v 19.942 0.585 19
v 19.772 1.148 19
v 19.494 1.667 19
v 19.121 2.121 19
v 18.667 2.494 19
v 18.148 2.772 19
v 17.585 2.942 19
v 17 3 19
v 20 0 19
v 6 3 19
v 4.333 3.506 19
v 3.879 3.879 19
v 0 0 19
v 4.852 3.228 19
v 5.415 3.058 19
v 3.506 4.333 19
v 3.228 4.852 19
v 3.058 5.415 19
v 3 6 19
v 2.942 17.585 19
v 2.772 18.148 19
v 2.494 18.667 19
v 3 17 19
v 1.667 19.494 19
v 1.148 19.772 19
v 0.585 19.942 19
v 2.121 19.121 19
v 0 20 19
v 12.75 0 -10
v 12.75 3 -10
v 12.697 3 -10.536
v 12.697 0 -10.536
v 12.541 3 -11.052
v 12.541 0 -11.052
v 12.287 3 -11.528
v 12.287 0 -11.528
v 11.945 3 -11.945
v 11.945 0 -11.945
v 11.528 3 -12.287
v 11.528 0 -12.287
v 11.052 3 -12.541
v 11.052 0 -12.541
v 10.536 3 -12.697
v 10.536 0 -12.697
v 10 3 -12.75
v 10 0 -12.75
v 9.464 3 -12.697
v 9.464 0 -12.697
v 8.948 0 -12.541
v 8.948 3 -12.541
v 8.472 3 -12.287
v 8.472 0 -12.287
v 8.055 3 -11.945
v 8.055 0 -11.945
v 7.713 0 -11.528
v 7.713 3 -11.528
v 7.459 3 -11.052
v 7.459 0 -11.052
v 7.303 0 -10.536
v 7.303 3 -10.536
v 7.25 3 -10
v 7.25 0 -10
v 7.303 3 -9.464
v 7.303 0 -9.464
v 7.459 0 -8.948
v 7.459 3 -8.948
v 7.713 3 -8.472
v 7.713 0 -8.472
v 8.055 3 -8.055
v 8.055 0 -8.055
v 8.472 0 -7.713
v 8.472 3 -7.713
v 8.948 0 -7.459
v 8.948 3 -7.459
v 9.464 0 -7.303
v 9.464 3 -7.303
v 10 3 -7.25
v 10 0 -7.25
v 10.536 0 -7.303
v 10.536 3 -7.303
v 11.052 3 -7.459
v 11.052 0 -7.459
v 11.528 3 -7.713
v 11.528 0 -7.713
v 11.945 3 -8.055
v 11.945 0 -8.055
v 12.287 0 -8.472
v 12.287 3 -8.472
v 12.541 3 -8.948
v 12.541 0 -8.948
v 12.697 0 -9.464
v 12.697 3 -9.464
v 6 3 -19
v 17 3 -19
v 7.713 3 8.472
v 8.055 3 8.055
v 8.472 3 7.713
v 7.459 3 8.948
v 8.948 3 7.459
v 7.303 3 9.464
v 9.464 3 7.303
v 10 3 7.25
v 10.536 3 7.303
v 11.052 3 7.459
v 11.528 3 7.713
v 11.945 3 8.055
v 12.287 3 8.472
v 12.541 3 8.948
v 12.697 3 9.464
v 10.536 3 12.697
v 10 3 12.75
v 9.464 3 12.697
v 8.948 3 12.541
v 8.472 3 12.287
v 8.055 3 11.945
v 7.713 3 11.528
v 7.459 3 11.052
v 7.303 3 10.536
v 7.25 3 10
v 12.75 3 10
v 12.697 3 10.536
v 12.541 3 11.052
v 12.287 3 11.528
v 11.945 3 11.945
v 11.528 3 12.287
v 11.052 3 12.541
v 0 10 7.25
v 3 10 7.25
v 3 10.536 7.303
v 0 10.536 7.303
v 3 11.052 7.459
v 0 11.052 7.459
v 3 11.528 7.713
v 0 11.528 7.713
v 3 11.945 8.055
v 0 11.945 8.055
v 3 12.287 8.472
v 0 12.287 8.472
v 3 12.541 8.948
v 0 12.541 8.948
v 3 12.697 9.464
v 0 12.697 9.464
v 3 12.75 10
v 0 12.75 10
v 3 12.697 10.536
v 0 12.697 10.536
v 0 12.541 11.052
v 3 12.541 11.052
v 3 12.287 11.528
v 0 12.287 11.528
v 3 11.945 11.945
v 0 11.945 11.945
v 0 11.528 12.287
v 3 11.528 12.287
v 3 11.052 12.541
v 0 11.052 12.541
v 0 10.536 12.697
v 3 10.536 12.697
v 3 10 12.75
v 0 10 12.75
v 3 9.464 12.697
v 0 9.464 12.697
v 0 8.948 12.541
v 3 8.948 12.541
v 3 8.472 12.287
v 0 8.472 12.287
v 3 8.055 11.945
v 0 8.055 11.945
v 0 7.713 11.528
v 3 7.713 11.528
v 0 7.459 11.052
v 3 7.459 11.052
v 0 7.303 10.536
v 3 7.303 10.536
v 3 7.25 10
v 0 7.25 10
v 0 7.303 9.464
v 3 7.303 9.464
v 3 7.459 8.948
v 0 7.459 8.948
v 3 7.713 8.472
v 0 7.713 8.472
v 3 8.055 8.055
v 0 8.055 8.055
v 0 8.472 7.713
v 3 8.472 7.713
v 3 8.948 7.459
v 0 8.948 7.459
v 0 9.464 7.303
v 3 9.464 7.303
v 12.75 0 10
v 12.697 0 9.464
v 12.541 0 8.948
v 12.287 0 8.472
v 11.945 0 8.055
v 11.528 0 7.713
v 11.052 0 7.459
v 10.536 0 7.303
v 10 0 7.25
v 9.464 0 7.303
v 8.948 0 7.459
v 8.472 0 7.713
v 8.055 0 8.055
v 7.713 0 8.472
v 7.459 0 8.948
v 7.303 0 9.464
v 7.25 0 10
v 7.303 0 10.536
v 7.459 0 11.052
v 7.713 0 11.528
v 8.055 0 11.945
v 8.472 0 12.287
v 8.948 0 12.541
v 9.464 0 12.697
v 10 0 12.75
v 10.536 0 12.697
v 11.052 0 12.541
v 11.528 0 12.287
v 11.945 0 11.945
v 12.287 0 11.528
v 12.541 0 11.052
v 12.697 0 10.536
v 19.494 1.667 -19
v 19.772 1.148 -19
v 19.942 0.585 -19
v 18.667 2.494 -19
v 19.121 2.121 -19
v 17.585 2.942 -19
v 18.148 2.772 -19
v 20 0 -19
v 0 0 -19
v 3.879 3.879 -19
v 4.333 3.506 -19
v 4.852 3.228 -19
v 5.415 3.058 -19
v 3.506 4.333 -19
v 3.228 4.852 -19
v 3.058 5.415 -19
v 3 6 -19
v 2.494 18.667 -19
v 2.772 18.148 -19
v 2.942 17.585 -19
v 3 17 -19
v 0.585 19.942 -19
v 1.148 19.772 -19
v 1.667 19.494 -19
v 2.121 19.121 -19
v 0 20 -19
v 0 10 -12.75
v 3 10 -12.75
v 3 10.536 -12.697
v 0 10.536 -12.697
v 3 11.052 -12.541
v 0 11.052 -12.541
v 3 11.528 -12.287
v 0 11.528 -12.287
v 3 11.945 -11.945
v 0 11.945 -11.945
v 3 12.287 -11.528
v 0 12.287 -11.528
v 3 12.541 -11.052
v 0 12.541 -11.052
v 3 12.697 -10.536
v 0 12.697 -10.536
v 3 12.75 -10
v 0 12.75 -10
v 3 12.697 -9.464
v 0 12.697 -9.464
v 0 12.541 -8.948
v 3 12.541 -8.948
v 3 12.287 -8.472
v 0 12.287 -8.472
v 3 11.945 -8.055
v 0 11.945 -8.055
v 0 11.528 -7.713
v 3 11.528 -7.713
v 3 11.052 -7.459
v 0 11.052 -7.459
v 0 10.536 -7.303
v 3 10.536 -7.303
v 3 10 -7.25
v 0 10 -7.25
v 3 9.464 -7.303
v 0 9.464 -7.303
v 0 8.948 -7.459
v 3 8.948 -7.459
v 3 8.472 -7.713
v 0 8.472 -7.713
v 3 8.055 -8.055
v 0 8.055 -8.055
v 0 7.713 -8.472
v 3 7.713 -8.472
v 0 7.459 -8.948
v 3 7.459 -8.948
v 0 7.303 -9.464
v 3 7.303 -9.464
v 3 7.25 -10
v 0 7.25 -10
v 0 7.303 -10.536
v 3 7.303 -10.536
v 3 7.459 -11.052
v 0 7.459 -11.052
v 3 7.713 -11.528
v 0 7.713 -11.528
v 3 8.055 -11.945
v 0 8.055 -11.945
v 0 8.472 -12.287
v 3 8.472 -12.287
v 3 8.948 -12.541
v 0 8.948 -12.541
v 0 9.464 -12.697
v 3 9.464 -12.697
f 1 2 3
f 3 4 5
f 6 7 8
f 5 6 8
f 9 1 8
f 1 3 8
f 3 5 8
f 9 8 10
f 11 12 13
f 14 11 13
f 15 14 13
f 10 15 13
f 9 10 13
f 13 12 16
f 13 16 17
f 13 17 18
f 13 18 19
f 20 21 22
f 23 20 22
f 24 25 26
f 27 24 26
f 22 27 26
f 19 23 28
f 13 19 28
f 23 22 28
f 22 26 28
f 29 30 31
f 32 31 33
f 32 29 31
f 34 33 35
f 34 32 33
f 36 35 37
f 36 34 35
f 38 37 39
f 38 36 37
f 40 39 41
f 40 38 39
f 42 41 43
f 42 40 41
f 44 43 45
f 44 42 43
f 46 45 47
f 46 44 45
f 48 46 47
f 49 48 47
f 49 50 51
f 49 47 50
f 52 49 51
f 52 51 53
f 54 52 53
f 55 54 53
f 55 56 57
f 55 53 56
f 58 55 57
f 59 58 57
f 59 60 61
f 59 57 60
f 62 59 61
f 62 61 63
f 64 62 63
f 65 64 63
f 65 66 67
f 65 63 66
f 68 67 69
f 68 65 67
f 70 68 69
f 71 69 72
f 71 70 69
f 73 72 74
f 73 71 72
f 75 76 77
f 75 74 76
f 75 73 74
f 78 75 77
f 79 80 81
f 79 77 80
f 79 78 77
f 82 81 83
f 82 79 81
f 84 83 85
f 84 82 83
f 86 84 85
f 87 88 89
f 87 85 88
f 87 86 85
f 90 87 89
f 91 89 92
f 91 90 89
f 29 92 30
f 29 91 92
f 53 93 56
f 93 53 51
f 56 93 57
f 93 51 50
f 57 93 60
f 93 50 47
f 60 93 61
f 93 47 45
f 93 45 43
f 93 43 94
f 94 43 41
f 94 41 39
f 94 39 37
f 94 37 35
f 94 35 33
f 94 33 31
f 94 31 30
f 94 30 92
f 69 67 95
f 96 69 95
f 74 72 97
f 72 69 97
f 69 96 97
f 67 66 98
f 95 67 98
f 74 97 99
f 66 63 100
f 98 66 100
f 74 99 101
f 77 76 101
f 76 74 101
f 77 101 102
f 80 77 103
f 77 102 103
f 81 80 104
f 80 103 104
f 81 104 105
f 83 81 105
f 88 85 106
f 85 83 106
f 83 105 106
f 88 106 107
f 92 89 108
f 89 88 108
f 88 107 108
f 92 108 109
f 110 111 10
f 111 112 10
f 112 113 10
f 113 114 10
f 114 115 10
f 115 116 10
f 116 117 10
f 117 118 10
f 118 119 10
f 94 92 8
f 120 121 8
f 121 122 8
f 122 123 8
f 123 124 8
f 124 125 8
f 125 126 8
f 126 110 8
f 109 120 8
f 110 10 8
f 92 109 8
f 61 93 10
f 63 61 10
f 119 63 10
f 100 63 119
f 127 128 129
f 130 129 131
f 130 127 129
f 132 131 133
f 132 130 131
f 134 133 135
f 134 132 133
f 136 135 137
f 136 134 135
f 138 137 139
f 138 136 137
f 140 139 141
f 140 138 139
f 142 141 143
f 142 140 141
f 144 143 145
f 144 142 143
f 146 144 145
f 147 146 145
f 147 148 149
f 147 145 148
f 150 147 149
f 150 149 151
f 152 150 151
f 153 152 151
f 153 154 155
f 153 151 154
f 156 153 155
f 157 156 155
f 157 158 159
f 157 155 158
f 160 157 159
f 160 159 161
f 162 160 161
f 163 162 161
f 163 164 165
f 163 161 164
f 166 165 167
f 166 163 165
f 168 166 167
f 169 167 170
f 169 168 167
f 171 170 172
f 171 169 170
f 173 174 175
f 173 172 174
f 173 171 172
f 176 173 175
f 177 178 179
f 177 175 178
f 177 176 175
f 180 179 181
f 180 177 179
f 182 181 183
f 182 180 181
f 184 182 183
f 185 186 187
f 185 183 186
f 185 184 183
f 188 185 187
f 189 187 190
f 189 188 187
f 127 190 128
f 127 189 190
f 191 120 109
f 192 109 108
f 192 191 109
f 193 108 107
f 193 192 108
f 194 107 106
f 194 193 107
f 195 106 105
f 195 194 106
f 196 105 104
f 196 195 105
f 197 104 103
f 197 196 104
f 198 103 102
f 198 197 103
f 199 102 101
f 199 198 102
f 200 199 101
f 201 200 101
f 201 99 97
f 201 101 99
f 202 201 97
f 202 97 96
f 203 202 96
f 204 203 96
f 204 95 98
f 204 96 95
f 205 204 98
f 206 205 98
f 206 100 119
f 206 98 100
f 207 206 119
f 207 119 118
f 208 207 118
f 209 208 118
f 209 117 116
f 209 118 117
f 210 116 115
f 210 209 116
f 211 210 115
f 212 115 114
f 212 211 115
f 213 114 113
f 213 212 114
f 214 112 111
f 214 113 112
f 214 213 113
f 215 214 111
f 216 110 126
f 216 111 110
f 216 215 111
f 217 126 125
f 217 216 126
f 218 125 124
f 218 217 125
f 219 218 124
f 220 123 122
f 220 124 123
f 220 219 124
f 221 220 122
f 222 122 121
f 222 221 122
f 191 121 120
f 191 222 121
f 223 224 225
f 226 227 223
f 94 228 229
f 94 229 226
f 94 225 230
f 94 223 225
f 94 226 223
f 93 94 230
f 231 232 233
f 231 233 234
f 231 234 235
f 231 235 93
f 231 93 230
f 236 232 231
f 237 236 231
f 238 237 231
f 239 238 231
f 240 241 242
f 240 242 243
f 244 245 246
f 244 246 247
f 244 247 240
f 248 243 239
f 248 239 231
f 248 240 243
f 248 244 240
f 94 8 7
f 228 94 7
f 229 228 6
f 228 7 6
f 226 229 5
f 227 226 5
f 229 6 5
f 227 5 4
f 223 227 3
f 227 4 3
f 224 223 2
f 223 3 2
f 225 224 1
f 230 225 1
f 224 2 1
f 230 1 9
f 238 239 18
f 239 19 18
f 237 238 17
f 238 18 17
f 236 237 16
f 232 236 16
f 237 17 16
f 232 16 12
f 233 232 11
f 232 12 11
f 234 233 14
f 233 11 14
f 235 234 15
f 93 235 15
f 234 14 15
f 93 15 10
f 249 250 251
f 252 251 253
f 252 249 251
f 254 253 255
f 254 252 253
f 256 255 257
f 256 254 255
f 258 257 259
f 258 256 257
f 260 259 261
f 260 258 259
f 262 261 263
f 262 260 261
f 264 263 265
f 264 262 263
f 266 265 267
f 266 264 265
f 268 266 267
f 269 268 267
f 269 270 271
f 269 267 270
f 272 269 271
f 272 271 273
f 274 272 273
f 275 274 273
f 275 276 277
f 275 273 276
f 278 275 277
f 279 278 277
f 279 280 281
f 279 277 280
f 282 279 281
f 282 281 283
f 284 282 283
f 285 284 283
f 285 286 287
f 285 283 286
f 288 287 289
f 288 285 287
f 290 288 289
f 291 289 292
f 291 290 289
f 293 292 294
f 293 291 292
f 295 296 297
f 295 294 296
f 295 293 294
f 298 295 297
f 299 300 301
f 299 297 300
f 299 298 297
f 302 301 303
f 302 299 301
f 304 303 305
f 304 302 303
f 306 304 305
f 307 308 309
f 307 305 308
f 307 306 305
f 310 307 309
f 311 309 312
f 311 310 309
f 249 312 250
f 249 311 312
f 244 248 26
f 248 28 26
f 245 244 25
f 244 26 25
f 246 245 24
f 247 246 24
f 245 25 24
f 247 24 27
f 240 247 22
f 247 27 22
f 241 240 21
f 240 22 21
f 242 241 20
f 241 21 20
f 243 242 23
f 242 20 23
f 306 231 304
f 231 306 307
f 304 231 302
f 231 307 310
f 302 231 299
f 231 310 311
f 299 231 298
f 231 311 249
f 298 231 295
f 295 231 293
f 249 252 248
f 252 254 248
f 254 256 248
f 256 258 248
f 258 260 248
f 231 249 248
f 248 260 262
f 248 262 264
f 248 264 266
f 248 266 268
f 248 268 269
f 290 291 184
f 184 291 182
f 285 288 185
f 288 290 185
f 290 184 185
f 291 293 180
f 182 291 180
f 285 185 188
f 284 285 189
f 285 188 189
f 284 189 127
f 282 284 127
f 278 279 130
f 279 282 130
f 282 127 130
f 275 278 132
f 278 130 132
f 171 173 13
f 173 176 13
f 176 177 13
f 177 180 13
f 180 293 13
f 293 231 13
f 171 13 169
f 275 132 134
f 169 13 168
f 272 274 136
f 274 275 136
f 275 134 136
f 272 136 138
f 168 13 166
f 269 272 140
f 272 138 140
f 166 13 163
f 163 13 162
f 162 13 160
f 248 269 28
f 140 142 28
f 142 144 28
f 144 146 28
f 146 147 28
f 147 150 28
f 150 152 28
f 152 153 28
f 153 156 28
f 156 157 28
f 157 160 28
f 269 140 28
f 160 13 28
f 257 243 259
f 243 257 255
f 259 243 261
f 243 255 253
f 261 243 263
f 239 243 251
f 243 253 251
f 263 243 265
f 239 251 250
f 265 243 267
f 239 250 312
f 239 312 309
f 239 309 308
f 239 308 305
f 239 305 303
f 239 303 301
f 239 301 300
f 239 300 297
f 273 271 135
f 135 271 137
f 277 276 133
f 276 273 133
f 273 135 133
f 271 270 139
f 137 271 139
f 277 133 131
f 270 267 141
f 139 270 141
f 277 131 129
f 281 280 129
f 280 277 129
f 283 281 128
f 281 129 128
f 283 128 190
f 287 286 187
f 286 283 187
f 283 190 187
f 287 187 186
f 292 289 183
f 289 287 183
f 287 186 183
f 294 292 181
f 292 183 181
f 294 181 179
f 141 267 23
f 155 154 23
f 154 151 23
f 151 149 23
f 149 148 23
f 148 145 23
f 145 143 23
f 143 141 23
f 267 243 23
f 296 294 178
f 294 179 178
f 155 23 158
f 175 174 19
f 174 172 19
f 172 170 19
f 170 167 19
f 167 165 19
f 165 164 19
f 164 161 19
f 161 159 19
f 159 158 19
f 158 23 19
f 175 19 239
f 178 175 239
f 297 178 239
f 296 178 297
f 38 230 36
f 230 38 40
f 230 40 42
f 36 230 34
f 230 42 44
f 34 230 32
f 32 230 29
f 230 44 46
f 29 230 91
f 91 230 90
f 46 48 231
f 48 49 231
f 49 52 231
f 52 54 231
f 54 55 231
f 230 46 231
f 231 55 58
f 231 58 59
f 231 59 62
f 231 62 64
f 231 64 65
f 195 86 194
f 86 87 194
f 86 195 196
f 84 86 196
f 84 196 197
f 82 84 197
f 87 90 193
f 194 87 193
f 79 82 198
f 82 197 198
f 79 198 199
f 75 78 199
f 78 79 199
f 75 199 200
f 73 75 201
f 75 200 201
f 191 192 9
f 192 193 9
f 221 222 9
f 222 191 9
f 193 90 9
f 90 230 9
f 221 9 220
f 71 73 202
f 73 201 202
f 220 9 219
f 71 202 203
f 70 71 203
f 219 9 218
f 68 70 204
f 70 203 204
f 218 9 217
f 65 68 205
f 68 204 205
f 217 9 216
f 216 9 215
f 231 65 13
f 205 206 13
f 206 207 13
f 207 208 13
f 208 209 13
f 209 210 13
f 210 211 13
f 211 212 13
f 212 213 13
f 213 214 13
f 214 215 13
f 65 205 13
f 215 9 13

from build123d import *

# Parameters (mm, degrees)
BOSS_EXTRUDE1_DEPTH = 19
SKETCH2_R           = 2.75
CUT_EXTRUDE1_DEPTH  = 21
SKETCH3_R           = 2.75
CUT_EXTRUDE2_DEPTH  = 21


with BuildPart() as part:
    # Sketch1 → Boss-Extrude1 (new body, symmetric)
    with BuildSketch(Plane.XY):
        with BuildLine():
            Line((0, 0), (0, 20))
            ThreePointArc((0, 20), (2.121320344, 19.121320344), (3, 17))
            Line((3, 17), (3, 6))
            ThreePointArc((3, 6), (3.878679656, 3.878679656), (6, 3))
            Line((6, 3), (17, 3))
            ThreePointArc((17, 3), (19.121320344, 2.121320344), (20, 0))
            Line((20, 0), (0, 0))
        make_face()
    extrude(amount=BOSS_EXTRUDE1_DEPTH, both=True)

    # Sketch2 → Cut-Extrude1 (cut, through all)
    with BuildSketch(Plane(origin=(0, 0, 0), x_dir=(1, 0, 0), z_dir=(0, 1, 0))):
        with Locations((10, -10)):
            Circle(SKETCH2_R)
        with Locations((10, 10)):
            Circle(SKETCH2_R)
    extrude(amount=CUT_EXTRUDE1_DEPTH, mode=Mode.SUBTRACT)

    # Sketch3 → Cut-Extrude2 (cut, through all)
    with BuildSketch(Plane(origin=(0, 0, 0), x_dir=(0, 0, -1), z_dir=(1, 0, 0))):
        with Locations((-10, 10)):
            Circle(SKETCH3_R)
        with Locations((10, 10)):
            Circle(SKETCH3_R)
    extrude(amount=CUT_EXTRUDE2_DEPTH, mode=Mode.SUBTRACT)


solid = part.part
